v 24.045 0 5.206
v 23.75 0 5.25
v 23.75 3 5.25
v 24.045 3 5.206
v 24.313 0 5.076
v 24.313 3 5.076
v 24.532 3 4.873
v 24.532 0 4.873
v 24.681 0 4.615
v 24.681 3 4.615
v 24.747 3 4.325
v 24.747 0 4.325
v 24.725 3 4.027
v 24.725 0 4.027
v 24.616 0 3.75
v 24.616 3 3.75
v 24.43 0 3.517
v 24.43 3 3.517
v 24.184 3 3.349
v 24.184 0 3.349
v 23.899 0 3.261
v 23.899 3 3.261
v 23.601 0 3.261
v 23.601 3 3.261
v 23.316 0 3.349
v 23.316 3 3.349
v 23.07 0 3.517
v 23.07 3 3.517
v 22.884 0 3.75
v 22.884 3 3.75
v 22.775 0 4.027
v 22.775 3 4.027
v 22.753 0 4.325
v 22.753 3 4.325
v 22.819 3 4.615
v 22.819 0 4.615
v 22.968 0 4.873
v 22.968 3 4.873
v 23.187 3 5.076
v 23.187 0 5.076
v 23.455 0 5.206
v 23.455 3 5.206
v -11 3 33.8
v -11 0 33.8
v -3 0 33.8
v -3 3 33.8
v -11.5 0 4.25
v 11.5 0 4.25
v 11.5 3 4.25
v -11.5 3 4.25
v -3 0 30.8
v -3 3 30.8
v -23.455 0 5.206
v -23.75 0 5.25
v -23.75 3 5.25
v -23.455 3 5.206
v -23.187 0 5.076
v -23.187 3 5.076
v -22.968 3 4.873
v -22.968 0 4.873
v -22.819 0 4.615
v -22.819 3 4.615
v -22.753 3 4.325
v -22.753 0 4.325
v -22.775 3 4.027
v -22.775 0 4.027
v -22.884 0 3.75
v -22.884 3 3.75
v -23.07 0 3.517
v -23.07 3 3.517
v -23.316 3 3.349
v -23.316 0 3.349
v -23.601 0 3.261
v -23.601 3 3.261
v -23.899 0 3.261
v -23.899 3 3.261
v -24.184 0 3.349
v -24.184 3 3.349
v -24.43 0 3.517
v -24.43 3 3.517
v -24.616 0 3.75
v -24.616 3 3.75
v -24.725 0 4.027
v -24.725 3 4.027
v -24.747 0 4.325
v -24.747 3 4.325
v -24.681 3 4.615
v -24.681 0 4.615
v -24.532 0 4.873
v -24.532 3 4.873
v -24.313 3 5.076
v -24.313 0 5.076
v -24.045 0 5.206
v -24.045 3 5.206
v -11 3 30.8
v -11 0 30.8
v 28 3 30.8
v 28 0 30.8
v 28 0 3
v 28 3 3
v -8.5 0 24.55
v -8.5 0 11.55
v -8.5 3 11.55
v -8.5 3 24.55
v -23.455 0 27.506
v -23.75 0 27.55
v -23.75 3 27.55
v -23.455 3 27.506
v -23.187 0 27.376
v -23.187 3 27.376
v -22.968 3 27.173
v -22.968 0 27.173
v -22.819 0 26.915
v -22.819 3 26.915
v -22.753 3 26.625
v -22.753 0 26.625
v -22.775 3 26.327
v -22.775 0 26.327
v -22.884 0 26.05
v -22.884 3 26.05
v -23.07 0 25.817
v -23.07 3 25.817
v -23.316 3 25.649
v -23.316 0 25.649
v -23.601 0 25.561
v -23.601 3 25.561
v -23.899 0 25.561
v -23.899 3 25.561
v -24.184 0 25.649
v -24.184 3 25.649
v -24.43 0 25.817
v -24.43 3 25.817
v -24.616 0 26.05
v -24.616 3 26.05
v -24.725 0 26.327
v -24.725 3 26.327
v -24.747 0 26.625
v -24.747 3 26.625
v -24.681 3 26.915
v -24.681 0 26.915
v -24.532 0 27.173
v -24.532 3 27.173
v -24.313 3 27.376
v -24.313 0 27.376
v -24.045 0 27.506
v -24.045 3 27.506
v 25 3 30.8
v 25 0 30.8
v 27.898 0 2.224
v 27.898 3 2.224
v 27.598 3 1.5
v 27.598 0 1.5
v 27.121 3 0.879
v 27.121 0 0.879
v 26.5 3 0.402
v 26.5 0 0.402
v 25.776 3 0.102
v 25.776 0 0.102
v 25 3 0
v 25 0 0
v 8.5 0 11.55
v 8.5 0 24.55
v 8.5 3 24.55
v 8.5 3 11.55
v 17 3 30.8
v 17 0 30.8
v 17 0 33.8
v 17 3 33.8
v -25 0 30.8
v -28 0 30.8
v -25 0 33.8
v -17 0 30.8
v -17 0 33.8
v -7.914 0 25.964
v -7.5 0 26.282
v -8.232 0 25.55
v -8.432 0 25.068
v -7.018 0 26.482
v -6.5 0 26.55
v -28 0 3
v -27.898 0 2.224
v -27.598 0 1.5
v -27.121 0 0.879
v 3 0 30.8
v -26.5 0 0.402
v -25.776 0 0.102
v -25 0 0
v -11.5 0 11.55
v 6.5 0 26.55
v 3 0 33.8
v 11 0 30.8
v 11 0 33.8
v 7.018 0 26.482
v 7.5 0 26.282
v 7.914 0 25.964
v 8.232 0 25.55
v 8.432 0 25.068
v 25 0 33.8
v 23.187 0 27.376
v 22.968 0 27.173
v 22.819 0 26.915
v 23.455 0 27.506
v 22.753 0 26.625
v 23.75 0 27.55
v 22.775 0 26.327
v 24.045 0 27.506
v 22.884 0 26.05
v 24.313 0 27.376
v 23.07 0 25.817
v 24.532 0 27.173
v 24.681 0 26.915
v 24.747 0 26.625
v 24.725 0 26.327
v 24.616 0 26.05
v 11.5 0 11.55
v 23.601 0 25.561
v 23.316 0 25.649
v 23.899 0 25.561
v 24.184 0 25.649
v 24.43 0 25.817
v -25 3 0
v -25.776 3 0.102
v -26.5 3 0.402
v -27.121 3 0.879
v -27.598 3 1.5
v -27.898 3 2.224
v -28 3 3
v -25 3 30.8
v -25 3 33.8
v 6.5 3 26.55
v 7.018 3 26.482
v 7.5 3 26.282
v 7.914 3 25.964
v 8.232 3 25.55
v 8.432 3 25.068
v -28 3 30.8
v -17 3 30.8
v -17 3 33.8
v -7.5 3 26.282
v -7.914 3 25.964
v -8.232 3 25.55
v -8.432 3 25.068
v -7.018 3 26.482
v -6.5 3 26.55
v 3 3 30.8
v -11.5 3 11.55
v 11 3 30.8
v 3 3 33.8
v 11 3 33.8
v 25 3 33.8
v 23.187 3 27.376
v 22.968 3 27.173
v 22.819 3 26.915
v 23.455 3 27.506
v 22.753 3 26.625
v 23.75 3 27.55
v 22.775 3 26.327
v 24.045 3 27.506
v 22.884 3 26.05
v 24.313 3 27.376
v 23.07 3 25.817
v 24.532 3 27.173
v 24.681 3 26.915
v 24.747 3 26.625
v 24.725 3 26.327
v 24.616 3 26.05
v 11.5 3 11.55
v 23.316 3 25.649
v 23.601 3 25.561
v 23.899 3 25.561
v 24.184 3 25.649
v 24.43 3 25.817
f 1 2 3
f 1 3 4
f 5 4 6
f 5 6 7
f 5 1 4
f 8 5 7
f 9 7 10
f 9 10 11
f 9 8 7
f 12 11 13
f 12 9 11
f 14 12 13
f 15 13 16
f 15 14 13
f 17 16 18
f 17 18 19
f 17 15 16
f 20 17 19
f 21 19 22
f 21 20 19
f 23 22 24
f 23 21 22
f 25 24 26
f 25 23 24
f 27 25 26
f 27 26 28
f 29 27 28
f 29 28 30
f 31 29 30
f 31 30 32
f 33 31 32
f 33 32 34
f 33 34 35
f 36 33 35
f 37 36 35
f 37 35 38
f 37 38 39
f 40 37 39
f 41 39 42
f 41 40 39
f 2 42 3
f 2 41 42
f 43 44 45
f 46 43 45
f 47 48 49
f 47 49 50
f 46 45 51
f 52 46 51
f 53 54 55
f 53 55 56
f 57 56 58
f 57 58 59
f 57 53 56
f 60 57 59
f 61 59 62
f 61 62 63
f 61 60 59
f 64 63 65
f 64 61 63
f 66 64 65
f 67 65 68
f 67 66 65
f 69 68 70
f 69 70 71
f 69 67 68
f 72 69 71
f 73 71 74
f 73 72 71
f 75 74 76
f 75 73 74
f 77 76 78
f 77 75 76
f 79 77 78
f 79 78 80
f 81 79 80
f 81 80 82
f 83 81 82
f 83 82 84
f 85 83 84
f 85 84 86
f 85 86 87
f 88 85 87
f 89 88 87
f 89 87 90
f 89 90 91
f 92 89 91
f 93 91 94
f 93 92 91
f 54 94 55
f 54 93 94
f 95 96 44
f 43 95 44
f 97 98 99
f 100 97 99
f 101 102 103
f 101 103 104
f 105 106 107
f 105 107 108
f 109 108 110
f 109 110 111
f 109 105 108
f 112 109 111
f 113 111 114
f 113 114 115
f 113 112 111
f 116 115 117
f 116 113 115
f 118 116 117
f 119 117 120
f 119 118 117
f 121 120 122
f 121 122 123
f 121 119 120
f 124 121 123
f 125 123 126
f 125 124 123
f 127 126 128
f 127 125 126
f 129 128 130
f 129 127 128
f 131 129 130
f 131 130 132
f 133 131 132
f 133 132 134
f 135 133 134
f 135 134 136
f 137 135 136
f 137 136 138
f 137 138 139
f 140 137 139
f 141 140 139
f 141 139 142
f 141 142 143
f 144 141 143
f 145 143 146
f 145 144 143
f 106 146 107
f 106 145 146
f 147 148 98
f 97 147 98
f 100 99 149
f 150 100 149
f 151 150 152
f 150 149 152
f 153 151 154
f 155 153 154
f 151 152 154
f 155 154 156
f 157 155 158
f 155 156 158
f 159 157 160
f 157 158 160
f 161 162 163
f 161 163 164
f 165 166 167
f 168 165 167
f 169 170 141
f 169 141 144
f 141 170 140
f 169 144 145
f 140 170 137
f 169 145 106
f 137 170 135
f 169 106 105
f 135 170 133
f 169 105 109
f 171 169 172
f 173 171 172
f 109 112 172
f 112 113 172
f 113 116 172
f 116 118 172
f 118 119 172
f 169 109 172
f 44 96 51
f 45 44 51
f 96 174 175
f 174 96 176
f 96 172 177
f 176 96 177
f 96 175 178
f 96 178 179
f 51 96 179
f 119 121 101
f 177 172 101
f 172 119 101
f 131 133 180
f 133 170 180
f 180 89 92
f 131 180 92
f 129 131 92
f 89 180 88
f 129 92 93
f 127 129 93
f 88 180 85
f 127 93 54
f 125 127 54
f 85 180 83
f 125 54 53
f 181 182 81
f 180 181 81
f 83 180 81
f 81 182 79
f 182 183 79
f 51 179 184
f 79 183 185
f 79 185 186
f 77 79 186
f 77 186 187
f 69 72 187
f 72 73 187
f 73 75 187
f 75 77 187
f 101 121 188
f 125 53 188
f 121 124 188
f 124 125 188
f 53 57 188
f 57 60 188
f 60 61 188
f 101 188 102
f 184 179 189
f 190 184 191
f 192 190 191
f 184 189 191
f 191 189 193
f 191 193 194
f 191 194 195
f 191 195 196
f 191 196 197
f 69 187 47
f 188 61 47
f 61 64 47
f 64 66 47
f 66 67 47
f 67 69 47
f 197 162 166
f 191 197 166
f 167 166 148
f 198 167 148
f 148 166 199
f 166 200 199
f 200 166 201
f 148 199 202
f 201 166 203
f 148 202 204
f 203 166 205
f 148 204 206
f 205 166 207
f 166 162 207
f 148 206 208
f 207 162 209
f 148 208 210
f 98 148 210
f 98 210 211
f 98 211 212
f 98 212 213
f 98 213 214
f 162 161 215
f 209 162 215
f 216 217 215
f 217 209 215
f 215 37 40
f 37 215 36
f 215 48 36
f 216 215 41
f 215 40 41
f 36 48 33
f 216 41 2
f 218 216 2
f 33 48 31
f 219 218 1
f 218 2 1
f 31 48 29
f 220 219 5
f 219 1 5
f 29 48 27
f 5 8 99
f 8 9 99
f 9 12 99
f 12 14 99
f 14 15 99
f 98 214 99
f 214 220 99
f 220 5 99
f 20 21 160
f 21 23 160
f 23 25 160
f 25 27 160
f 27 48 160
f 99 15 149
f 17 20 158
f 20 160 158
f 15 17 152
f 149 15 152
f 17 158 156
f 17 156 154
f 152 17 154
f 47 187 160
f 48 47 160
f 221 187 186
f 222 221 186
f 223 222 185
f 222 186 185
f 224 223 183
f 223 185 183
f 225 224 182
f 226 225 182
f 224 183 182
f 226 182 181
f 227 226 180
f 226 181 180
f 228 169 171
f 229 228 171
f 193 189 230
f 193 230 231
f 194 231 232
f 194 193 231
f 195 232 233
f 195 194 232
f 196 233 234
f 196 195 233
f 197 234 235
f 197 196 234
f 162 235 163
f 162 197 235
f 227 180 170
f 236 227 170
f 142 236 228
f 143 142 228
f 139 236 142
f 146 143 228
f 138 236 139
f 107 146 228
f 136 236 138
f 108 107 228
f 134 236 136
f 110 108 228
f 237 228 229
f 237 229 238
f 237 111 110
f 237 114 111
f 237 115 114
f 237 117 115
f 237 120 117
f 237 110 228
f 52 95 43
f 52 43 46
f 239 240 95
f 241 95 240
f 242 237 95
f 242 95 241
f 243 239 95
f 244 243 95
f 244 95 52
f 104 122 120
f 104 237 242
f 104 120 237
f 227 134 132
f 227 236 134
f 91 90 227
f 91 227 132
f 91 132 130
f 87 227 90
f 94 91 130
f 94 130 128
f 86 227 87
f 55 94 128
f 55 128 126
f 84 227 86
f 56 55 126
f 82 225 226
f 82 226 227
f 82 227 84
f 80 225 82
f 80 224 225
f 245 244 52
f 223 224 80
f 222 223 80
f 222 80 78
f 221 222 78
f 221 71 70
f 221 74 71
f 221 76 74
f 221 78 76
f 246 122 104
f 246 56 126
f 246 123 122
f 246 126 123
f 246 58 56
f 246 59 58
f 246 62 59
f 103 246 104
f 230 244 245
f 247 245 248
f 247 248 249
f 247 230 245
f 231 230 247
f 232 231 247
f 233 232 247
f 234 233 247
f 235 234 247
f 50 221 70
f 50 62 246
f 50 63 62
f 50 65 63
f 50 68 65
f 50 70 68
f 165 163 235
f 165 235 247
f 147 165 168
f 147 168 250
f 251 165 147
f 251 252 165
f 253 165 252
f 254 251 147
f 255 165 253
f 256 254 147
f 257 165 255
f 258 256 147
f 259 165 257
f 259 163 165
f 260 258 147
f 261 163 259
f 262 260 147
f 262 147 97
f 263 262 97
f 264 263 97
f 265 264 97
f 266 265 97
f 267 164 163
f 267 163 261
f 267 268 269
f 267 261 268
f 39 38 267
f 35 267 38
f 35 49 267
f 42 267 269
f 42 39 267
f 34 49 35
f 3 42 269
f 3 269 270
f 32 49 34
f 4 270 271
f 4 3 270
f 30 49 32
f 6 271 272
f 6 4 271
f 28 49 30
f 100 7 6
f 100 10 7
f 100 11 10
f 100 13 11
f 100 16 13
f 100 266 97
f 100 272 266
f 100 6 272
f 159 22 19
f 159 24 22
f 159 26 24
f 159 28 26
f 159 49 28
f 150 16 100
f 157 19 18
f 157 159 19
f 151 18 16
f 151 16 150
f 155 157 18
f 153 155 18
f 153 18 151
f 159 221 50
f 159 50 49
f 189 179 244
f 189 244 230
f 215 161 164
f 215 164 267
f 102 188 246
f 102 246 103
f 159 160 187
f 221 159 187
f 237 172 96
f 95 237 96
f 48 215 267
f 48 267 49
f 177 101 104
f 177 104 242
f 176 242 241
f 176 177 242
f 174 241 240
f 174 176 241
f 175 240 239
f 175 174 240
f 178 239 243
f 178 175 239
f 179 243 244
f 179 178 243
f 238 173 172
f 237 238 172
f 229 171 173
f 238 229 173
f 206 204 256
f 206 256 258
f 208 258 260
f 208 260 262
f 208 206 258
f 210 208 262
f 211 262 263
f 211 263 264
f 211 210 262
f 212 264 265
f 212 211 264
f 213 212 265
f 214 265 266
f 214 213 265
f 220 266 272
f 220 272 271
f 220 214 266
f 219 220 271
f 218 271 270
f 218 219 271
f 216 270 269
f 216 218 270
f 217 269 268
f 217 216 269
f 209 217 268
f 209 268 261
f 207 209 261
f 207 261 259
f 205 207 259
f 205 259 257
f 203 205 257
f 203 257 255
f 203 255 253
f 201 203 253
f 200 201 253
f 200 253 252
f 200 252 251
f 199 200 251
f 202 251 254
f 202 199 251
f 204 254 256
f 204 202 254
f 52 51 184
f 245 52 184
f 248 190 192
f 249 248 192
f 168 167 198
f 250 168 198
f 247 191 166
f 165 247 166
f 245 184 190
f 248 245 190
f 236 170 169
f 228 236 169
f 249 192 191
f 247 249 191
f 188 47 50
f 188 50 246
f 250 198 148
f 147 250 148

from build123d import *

# Parameters (mm, degrees)
ESQUISSE1_R        = 1
BOSS_EXTRU_1_DEPTH = 3


with BuildPart() as part:
    # Esquisse1 → Boss.-Extru.1 (new body)
    with BuildSketch(Plane(origin=(0, 0, 0), x_dir=(1, 0, 0), z_dir=(0, 1, 0))):
        with BuildLine():
            Line((-28, -30.8), (-25, -30.8))
            Line((-25, -30.8), (-25, -33.8))
            Line((-25, -33.8), (-17, -33.8))
            Line((-17, -33.8), (-17, -30.8))
            Line((-17, -30.8), (-11, -30.8))
            Line((-11, -30.8), (-11, -33.8))
            Line((-11, -33.8), (-3, -33.8))
            Line((-3, -33.8), (-3, -30.8))
            Line((-3, -30.8), (3, -30.8))
            Line((3, -30.8), (3, -33.8))
            Line((3, -33.8), (11, -33.8))
            Line((11, -33.8), (11, -30.8))
            Line((11, -30.8), (17, -30.8))
            Line((17, -30.8), (17, -33.8))
            Line((17, -33.8), (25, -33.8))
            Line((25, -33.8), (25, -30.8))
            Line((25, -30.8), (28, -30.8))
            Line((28, -30.8), (28, -3))
            ThreePointArc((28, -3), (27.121320344, -0.878679656), (25, 0))
            Line((25, 0), (-25, 0))
            ThreePointArc((-25, 0), (-27.121320344, -0.878679656), (-28, -3))
            Line((-28, -3), (-28, -30.8))
        make_face()
        with Locations(Location((-23.75, -4.25, 0), (0, 0, 270))):
            Circle(ESQUISSE1_R, mode=Mode.SUBTRACT)
        with Locations(Location((-23.75, -26.55, 0), (0, 0, 270))):
            Circle(ESQUISSE1_R, mode=Mode.SUBTRACT)
        with Locations(Location((23.75, -26.55, 0), (0, 0, 270))):
            Circle(ESQUISSE1_R, mode=Mode.SUBTRACT)
        with Locations(Location((23.75, -4.25, 0), (0, 0, 270))):
            Circle(ESQUISSE1_R, mode=Mode.SUBTRACT)
        with BuildLine():
            Line((-11.5, -11.55), (-8.5, -11.55))
            Line((-8.5, -11.55), (-8.5, -24.55))
            ThreePointArc((-8.5, -24.55), (-7.914213562, -25.964213562), (-6.5, -26.55))
            Line((-6.5, -26.55), (6.5, -26.55))
            ThreePointArc((6.5, -26.55), (7.914213562, -25.964213562), (8.5, -24.55))
            Line((8.5, -24.55), (8.5, -11.55))
            Line((8.5, -11.55), (11.5, -11.55))
            Line((11.5, -11.55), (11.5, -4.25))
            Line((11.5, -4.25), (-11.5, -4.25))
            Line((-11.5, -4.25), (-11.5, -11.55))
        make_face(mode=Mode.SUBTRACT)
    extrude(amount=BOSS_EXTRU_1_DEPTH)


solid = part.part
